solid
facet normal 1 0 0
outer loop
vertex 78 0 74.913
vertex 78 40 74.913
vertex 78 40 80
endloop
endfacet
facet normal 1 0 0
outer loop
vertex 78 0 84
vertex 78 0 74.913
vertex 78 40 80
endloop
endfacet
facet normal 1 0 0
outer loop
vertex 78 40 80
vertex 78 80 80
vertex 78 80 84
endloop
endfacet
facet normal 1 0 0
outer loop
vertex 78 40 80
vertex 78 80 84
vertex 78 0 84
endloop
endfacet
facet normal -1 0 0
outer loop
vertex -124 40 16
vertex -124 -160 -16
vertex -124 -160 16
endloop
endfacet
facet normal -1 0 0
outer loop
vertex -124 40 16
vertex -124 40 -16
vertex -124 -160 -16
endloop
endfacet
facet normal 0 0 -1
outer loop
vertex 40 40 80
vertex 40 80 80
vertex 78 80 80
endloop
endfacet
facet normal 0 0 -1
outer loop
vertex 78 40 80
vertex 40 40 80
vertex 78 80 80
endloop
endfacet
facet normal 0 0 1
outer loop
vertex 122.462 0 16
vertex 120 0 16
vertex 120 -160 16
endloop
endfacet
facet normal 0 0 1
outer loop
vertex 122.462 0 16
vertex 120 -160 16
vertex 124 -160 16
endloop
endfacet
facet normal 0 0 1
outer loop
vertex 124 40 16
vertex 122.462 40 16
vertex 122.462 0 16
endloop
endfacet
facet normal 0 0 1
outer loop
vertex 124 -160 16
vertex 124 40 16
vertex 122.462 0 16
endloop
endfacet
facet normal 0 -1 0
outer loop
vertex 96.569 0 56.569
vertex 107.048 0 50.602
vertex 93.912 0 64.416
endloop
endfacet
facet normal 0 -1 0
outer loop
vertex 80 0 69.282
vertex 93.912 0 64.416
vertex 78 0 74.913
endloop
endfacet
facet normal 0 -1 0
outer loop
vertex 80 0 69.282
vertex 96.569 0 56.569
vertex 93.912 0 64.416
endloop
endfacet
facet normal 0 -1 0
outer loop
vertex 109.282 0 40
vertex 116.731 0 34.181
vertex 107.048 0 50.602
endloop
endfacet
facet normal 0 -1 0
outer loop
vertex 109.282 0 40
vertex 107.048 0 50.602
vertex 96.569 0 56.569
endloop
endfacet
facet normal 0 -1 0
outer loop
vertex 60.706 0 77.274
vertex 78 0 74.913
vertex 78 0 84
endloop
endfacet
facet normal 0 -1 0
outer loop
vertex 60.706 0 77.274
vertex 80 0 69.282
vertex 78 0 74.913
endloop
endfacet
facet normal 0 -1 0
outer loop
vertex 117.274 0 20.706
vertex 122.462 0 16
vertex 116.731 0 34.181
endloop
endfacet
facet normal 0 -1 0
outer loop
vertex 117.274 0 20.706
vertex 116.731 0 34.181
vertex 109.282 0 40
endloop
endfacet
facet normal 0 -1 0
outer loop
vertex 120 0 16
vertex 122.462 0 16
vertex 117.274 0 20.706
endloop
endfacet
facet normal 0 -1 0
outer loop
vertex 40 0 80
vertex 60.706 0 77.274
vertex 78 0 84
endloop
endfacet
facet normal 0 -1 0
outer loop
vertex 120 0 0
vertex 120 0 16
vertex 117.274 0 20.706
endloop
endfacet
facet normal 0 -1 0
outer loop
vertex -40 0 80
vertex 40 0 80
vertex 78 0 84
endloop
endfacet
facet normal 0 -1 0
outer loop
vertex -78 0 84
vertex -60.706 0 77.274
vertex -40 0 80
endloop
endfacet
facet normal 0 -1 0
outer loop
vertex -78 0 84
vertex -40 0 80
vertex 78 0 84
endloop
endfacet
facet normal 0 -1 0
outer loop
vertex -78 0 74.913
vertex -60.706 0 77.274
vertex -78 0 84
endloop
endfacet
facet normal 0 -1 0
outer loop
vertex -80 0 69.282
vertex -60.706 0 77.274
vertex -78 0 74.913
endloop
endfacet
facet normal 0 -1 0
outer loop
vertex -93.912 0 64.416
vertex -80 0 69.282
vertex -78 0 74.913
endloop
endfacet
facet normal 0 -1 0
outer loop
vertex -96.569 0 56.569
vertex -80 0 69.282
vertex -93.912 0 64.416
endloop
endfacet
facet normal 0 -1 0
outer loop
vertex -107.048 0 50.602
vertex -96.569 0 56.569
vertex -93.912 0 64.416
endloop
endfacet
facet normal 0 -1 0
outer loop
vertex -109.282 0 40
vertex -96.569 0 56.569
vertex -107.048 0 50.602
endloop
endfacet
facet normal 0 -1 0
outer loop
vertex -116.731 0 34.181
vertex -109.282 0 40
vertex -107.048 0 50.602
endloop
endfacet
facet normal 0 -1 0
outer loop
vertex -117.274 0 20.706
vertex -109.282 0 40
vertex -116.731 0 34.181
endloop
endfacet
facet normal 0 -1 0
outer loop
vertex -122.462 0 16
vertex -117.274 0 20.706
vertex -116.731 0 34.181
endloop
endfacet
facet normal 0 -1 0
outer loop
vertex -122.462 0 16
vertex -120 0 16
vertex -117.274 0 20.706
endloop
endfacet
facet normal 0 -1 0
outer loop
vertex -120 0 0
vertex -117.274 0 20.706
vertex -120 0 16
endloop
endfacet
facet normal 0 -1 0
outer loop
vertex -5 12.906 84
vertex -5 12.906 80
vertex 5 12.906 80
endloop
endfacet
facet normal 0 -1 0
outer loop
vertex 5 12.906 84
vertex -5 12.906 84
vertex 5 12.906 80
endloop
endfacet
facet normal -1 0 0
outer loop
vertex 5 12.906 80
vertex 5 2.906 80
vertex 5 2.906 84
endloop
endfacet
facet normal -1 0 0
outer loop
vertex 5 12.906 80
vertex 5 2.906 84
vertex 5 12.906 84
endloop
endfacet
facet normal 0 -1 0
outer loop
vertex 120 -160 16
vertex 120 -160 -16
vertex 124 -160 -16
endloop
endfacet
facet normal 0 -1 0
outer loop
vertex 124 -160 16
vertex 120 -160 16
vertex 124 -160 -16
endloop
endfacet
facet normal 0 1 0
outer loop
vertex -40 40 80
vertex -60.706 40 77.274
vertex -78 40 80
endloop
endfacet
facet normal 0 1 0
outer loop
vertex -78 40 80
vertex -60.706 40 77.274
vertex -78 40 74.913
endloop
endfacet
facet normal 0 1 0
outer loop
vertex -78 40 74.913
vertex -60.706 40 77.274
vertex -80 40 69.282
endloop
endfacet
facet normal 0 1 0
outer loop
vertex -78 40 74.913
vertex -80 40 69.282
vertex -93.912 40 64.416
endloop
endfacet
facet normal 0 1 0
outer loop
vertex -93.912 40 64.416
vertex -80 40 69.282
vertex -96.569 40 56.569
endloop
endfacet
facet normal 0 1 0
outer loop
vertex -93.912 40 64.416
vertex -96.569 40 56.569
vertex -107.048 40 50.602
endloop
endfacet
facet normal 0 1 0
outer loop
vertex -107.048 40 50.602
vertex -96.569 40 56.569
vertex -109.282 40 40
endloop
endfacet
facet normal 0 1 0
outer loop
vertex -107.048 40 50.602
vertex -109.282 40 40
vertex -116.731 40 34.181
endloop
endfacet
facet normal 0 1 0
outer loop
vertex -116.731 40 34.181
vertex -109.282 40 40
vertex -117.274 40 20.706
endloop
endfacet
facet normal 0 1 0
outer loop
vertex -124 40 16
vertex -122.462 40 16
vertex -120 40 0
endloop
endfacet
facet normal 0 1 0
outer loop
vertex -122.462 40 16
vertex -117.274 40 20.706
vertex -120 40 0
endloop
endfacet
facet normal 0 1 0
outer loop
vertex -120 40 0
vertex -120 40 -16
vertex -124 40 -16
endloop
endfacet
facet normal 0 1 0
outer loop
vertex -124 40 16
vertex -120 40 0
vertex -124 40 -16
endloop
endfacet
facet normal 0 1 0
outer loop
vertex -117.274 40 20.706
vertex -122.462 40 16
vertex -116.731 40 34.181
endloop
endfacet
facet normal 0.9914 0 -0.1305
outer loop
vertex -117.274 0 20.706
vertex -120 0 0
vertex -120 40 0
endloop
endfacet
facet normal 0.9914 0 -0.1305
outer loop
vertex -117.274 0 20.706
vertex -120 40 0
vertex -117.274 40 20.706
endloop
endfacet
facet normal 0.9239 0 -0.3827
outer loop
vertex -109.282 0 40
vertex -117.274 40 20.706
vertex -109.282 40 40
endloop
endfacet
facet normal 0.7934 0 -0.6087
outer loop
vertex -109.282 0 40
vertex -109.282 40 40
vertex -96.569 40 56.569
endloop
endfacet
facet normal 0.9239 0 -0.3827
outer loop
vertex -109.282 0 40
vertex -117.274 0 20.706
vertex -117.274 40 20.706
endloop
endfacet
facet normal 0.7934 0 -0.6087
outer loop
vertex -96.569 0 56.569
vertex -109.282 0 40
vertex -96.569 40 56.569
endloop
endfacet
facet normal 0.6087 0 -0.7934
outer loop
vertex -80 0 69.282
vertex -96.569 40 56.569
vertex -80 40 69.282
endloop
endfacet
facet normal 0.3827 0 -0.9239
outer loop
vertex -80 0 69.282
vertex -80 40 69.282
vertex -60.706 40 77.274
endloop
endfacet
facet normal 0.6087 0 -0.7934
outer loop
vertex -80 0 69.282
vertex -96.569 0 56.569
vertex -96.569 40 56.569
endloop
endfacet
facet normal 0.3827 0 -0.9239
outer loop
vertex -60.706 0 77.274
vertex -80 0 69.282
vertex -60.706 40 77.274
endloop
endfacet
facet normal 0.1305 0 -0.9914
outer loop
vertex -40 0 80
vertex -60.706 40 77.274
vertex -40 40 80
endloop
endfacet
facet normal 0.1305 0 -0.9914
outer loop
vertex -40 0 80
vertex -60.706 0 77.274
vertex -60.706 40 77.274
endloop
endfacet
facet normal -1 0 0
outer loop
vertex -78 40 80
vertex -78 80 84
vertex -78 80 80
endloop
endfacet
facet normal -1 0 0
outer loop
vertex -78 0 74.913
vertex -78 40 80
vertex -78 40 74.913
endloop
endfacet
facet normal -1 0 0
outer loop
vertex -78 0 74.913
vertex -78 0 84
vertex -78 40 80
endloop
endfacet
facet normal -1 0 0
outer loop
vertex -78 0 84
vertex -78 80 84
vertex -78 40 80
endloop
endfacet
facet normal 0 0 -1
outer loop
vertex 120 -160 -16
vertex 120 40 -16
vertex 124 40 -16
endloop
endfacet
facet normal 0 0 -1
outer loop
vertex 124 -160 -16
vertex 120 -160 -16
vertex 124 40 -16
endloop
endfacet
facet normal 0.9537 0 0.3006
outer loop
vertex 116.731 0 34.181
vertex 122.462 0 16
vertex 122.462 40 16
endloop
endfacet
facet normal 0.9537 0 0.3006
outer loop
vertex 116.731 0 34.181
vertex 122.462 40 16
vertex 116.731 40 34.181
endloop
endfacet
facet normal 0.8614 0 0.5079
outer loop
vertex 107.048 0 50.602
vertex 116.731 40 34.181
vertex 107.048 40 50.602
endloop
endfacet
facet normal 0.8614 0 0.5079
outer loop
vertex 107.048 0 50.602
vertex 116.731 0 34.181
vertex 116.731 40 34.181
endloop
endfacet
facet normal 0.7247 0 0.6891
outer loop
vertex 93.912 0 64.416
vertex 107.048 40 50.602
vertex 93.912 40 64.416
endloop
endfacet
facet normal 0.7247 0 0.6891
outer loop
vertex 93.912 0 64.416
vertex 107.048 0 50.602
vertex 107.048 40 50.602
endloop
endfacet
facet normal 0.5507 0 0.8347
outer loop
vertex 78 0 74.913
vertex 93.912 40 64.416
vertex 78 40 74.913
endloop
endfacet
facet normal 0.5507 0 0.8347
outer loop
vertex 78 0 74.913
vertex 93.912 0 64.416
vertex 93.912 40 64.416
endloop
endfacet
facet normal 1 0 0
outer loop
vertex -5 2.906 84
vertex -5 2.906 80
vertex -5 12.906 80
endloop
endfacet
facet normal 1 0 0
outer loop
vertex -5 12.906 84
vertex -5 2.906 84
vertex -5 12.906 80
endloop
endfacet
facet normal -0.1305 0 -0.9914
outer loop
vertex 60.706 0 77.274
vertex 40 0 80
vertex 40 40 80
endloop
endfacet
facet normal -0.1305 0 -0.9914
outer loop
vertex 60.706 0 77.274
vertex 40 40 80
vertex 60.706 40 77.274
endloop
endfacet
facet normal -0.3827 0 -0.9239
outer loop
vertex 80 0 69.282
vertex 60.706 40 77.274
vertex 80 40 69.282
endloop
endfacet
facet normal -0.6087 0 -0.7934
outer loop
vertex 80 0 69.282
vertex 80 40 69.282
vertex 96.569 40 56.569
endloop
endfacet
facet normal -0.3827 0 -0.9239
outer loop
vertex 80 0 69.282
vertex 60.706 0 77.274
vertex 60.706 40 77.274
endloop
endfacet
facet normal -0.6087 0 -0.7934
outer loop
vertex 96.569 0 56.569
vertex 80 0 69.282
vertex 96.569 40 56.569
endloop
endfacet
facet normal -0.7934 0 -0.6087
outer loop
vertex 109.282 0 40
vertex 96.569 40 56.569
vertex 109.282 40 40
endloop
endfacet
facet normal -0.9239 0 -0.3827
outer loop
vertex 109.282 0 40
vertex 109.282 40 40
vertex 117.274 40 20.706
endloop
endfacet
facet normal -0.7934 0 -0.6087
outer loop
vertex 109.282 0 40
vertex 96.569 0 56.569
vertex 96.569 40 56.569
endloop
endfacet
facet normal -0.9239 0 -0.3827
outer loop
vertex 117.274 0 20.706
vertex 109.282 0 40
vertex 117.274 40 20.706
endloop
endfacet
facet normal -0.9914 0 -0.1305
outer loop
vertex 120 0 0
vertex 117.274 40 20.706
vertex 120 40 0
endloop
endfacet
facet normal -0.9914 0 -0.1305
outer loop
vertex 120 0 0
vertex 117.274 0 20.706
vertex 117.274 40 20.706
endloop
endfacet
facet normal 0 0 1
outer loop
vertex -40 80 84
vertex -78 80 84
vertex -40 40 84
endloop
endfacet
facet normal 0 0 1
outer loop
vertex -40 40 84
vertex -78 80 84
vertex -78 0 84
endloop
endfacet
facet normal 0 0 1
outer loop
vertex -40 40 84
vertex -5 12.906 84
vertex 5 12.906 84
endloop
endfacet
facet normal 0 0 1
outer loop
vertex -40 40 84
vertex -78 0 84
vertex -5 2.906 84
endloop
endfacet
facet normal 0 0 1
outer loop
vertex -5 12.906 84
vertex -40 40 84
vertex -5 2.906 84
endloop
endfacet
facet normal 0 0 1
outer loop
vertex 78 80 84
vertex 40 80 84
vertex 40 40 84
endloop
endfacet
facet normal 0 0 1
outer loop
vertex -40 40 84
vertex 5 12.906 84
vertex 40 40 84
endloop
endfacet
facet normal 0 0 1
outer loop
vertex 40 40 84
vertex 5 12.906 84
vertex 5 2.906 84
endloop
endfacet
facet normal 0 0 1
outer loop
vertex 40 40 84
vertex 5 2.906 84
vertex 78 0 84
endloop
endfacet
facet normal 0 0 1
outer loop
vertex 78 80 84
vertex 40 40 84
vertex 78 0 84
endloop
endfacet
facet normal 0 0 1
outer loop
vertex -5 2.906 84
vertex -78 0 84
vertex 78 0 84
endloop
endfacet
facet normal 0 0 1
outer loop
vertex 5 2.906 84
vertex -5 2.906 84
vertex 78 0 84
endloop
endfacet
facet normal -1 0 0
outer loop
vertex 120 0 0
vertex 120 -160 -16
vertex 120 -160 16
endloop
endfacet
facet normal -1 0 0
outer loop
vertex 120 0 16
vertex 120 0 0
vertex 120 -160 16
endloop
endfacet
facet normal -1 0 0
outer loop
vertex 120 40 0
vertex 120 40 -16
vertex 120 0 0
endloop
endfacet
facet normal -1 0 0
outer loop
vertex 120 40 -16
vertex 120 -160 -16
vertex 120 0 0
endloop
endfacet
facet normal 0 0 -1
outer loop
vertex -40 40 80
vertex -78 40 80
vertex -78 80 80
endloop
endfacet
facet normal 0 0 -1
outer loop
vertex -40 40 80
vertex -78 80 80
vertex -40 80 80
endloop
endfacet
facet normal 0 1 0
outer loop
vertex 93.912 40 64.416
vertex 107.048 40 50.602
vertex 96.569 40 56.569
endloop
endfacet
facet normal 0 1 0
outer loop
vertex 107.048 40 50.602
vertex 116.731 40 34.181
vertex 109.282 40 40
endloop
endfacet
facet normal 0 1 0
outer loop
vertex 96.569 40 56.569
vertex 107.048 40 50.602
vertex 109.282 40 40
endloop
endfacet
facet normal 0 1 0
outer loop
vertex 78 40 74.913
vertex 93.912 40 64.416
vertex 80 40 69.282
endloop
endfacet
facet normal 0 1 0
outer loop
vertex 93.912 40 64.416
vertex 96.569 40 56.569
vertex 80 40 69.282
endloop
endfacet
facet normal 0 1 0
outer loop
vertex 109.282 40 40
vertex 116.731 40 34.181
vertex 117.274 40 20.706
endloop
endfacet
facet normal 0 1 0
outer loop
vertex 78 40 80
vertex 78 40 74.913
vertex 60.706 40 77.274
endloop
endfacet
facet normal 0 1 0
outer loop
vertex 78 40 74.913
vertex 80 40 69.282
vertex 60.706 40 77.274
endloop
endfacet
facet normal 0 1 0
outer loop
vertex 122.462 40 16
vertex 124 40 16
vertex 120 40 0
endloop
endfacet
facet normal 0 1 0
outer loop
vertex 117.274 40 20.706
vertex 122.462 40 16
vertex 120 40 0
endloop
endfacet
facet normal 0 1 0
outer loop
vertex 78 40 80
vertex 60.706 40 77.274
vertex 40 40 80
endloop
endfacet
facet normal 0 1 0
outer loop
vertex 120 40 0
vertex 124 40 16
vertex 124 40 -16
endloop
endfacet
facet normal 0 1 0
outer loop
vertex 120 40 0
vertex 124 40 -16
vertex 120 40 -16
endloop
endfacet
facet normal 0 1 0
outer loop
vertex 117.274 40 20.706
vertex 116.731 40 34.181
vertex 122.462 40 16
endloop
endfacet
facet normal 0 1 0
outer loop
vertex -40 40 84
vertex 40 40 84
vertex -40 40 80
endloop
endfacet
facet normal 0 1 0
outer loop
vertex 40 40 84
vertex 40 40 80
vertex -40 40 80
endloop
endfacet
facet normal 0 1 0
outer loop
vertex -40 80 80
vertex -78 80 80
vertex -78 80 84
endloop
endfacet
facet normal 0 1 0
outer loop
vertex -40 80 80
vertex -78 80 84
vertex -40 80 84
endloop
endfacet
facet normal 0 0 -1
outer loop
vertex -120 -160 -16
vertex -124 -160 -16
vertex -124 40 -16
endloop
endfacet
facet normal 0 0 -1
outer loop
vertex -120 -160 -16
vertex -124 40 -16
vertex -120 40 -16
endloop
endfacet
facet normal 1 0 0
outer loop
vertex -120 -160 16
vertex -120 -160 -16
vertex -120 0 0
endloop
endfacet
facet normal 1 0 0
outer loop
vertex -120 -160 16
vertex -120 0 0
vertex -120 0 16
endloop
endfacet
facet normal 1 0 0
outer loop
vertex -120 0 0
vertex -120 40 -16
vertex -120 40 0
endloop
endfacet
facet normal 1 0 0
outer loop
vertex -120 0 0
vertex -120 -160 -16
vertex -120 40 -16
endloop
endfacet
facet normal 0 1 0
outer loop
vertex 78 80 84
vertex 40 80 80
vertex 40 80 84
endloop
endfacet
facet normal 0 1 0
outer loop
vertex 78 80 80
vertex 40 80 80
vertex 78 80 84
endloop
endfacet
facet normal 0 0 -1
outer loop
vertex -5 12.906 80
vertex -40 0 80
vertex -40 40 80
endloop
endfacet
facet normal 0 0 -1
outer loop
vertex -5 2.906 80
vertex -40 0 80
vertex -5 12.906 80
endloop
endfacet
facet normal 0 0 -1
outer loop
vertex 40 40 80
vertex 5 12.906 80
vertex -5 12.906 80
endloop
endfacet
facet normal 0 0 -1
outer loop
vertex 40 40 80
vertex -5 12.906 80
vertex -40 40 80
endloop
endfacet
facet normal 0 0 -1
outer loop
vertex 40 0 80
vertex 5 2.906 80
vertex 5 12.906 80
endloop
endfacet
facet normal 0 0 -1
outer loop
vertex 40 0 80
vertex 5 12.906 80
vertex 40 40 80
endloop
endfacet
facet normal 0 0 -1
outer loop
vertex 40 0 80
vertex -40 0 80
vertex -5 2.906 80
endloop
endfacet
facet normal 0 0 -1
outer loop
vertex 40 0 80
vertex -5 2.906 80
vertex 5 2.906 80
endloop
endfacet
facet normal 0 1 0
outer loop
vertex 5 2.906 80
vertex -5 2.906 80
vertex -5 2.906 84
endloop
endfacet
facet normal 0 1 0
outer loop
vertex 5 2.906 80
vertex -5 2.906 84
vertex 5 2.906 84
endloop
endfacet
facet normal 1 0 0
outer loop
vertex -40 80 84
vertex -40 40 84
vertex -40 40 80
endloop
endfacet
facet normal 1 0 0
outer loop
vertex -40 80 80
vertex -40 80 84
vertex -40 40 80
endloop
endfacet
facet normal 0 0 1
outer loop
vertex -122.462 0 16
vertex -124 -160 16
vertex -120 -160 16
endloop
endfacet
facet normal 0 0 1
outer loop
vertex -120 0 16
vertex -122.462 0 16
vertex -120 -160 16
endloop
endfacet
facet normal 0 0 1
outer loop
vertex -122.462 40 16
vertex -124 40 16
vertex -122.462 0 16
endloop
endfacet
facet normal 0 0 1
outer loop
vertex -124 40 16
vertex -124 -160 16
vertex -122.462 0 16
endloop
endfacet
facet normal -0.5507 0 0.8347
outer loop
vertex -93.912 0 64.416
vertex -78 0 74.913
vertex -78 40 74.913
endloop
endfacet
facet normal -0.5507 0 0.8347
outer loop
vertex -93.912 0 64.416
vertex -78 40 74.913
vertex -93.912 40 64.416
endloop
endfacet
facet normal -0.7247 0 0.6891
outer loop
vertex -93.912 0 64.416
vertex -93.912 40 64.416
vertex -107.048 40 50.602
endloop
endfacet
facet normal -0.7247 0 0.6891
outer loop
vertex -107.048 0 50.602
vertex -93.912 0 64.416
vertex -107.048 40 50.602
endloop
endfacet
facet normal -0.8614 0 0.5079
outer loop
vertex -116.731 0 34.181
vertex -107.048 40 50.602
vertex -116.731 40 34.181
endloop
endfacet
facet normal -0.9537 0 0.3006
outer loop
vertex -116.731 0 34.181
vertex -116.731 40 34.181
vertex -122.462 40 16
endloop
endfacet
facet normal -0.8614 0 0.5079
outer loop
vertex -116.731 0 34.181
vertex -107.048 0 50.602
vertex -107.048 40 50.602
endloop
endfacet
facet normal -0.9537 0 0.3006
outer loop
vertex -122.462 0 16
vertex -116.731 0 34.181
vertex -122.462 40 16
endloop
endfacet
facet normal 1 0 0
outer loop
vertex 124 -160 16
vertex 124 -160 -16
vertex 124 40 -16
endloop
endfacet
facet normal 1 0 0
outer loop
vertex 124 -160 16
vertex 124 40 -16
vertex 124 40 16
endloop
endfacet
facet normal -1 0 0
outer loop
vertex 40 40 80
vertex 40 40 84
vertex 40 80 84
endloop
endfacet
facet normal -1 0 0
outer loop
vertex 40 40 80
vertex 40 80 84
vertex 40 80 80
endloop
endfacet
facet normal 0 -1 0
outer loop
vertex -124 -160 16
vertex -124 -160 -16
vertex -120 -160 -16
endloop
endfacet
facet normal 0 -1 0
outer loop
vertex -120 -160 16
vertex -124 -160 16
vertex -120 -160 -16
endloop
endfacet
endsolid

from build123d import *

# Parameters (mm, degrees)
EXTRUDE_1_DEPTH          = 40
SKETCH_3_W               = 4
SKETCH_3_H               = 32
EXTRUDE_2_DEPTH          = 160
EXTRUDE_3_DEPTH          = 40
SKETCH_6_W               = 38
SKETCH_6_H               = 4
EXTRUDE_4_DEPTH          = 40
CUT_EXTRUDE_1_DEPTH      = 226.778652667
CUT_EXTRUDE_1_DEPTH_BACK = 226.778652667
SKETCH_4_W               = 10
SKETCH_4_H               = 10


with BuildPart() as part:
    # 草图2 → 凸台-拉伸1 (new body)
    with BuildSketch(Plane(origin=(0, 0, 0), x_dir=(1, 0, 0), z_dir=(0, 1, 0))):
        with BuildLine():
            Line((-40, -80), (40, -80))
            ThreePointArc((40, -80), (96.568542495, -56.568542495), (120, 0))
            Line((120, 0), (120, 16))
            Line((120, 16), (124, 16))
            Line((124, 16), (124, -16))
            Line((124, -16), (122.462112512, -16))
            ThreePointArc((122.462112512, -16), (93.441556864, -64.807406984), (40, -84))
            Line((40, -84), (-40, -84))
            ThreePointArc((-40, -84), (-93.441556864, -64.807406984), (-122.462112512, -16))
            Line((-122.462112512, -16), (-124, -16))
            Line((-124, -16), (-124, 16))
            Line((-124, 16), (-120, 16))
            Line((-120, 16), (-120, 0))
            ThreePointArc((-120, 0), (-96.568542495, -56.568542495), (-40, -80))
        make_face()
    extrude(amount=EXTRUDE_1_DEPTH)

    # 草图3 → 凸台-拉伸2 (add)
    with BuildSketch(Plane.XZ):
        with Locations((-122, 0)):
            Rectangle(SKETCH_3_W, SKETCH_3_H)
        with Locations((122, 0)):
            Rectangle(SKETCH_3_W, SKETCH_3_H)
    extrude(amount=EXTRUDE_2_DEPTH)

    # 草图5 → 凸台-拉伸3 (add)
    with BuildSketch(Plane(origin=(0, 40, 0), x_dir=(1, 0, 0), z_dir=(0, 1, 0))):
        Polygon((-40, -84), (-78, -84), (-78, -74.913283201), (-55.5334574, -80.946187921), (52.897278528, -80.946187921), (78, -72.607731722), (78, -84), (40, -84), align=None)
    extrude(amount=-EXTRUDE_3_DEPTH)

    # 草图6 → 凸台-拉伸4 (add)
    with BuildSketch(Plane(origin=(0, 40, 0), x_dir=(1, 0, 0), z_dir=(0, 1, 0))):
        with Locations((-59, -82)):
            Rectangle(SKETCH_6_W, SKETCH_6_H)
        with Locations((59, -82)):
            Rectangle(SKETCH_6_W, SKETCH_6_H)
    extrude(amount=EXTRUDE_4_DEPTH)

    # 草图4 → 切除-拉伸1 (cut, two sides: drawn at the far end of the back side and taken through both)
    with BuildSketch(Plane.XY.offset(84).offset(-CUT_EXTRUDE_1_DEPTH_BACK)):
        with Locations((0, 7.906009126)):
            Rectangle(SKETCH_4_W, SKETCH_4_H)
    extrude(amount=CUT_EXTRUDE_1_DEPTH + CUT_EXTRUDE_1_DEPTH_BACK, mode=Mode.SUBTRACT)


solid = part.part
